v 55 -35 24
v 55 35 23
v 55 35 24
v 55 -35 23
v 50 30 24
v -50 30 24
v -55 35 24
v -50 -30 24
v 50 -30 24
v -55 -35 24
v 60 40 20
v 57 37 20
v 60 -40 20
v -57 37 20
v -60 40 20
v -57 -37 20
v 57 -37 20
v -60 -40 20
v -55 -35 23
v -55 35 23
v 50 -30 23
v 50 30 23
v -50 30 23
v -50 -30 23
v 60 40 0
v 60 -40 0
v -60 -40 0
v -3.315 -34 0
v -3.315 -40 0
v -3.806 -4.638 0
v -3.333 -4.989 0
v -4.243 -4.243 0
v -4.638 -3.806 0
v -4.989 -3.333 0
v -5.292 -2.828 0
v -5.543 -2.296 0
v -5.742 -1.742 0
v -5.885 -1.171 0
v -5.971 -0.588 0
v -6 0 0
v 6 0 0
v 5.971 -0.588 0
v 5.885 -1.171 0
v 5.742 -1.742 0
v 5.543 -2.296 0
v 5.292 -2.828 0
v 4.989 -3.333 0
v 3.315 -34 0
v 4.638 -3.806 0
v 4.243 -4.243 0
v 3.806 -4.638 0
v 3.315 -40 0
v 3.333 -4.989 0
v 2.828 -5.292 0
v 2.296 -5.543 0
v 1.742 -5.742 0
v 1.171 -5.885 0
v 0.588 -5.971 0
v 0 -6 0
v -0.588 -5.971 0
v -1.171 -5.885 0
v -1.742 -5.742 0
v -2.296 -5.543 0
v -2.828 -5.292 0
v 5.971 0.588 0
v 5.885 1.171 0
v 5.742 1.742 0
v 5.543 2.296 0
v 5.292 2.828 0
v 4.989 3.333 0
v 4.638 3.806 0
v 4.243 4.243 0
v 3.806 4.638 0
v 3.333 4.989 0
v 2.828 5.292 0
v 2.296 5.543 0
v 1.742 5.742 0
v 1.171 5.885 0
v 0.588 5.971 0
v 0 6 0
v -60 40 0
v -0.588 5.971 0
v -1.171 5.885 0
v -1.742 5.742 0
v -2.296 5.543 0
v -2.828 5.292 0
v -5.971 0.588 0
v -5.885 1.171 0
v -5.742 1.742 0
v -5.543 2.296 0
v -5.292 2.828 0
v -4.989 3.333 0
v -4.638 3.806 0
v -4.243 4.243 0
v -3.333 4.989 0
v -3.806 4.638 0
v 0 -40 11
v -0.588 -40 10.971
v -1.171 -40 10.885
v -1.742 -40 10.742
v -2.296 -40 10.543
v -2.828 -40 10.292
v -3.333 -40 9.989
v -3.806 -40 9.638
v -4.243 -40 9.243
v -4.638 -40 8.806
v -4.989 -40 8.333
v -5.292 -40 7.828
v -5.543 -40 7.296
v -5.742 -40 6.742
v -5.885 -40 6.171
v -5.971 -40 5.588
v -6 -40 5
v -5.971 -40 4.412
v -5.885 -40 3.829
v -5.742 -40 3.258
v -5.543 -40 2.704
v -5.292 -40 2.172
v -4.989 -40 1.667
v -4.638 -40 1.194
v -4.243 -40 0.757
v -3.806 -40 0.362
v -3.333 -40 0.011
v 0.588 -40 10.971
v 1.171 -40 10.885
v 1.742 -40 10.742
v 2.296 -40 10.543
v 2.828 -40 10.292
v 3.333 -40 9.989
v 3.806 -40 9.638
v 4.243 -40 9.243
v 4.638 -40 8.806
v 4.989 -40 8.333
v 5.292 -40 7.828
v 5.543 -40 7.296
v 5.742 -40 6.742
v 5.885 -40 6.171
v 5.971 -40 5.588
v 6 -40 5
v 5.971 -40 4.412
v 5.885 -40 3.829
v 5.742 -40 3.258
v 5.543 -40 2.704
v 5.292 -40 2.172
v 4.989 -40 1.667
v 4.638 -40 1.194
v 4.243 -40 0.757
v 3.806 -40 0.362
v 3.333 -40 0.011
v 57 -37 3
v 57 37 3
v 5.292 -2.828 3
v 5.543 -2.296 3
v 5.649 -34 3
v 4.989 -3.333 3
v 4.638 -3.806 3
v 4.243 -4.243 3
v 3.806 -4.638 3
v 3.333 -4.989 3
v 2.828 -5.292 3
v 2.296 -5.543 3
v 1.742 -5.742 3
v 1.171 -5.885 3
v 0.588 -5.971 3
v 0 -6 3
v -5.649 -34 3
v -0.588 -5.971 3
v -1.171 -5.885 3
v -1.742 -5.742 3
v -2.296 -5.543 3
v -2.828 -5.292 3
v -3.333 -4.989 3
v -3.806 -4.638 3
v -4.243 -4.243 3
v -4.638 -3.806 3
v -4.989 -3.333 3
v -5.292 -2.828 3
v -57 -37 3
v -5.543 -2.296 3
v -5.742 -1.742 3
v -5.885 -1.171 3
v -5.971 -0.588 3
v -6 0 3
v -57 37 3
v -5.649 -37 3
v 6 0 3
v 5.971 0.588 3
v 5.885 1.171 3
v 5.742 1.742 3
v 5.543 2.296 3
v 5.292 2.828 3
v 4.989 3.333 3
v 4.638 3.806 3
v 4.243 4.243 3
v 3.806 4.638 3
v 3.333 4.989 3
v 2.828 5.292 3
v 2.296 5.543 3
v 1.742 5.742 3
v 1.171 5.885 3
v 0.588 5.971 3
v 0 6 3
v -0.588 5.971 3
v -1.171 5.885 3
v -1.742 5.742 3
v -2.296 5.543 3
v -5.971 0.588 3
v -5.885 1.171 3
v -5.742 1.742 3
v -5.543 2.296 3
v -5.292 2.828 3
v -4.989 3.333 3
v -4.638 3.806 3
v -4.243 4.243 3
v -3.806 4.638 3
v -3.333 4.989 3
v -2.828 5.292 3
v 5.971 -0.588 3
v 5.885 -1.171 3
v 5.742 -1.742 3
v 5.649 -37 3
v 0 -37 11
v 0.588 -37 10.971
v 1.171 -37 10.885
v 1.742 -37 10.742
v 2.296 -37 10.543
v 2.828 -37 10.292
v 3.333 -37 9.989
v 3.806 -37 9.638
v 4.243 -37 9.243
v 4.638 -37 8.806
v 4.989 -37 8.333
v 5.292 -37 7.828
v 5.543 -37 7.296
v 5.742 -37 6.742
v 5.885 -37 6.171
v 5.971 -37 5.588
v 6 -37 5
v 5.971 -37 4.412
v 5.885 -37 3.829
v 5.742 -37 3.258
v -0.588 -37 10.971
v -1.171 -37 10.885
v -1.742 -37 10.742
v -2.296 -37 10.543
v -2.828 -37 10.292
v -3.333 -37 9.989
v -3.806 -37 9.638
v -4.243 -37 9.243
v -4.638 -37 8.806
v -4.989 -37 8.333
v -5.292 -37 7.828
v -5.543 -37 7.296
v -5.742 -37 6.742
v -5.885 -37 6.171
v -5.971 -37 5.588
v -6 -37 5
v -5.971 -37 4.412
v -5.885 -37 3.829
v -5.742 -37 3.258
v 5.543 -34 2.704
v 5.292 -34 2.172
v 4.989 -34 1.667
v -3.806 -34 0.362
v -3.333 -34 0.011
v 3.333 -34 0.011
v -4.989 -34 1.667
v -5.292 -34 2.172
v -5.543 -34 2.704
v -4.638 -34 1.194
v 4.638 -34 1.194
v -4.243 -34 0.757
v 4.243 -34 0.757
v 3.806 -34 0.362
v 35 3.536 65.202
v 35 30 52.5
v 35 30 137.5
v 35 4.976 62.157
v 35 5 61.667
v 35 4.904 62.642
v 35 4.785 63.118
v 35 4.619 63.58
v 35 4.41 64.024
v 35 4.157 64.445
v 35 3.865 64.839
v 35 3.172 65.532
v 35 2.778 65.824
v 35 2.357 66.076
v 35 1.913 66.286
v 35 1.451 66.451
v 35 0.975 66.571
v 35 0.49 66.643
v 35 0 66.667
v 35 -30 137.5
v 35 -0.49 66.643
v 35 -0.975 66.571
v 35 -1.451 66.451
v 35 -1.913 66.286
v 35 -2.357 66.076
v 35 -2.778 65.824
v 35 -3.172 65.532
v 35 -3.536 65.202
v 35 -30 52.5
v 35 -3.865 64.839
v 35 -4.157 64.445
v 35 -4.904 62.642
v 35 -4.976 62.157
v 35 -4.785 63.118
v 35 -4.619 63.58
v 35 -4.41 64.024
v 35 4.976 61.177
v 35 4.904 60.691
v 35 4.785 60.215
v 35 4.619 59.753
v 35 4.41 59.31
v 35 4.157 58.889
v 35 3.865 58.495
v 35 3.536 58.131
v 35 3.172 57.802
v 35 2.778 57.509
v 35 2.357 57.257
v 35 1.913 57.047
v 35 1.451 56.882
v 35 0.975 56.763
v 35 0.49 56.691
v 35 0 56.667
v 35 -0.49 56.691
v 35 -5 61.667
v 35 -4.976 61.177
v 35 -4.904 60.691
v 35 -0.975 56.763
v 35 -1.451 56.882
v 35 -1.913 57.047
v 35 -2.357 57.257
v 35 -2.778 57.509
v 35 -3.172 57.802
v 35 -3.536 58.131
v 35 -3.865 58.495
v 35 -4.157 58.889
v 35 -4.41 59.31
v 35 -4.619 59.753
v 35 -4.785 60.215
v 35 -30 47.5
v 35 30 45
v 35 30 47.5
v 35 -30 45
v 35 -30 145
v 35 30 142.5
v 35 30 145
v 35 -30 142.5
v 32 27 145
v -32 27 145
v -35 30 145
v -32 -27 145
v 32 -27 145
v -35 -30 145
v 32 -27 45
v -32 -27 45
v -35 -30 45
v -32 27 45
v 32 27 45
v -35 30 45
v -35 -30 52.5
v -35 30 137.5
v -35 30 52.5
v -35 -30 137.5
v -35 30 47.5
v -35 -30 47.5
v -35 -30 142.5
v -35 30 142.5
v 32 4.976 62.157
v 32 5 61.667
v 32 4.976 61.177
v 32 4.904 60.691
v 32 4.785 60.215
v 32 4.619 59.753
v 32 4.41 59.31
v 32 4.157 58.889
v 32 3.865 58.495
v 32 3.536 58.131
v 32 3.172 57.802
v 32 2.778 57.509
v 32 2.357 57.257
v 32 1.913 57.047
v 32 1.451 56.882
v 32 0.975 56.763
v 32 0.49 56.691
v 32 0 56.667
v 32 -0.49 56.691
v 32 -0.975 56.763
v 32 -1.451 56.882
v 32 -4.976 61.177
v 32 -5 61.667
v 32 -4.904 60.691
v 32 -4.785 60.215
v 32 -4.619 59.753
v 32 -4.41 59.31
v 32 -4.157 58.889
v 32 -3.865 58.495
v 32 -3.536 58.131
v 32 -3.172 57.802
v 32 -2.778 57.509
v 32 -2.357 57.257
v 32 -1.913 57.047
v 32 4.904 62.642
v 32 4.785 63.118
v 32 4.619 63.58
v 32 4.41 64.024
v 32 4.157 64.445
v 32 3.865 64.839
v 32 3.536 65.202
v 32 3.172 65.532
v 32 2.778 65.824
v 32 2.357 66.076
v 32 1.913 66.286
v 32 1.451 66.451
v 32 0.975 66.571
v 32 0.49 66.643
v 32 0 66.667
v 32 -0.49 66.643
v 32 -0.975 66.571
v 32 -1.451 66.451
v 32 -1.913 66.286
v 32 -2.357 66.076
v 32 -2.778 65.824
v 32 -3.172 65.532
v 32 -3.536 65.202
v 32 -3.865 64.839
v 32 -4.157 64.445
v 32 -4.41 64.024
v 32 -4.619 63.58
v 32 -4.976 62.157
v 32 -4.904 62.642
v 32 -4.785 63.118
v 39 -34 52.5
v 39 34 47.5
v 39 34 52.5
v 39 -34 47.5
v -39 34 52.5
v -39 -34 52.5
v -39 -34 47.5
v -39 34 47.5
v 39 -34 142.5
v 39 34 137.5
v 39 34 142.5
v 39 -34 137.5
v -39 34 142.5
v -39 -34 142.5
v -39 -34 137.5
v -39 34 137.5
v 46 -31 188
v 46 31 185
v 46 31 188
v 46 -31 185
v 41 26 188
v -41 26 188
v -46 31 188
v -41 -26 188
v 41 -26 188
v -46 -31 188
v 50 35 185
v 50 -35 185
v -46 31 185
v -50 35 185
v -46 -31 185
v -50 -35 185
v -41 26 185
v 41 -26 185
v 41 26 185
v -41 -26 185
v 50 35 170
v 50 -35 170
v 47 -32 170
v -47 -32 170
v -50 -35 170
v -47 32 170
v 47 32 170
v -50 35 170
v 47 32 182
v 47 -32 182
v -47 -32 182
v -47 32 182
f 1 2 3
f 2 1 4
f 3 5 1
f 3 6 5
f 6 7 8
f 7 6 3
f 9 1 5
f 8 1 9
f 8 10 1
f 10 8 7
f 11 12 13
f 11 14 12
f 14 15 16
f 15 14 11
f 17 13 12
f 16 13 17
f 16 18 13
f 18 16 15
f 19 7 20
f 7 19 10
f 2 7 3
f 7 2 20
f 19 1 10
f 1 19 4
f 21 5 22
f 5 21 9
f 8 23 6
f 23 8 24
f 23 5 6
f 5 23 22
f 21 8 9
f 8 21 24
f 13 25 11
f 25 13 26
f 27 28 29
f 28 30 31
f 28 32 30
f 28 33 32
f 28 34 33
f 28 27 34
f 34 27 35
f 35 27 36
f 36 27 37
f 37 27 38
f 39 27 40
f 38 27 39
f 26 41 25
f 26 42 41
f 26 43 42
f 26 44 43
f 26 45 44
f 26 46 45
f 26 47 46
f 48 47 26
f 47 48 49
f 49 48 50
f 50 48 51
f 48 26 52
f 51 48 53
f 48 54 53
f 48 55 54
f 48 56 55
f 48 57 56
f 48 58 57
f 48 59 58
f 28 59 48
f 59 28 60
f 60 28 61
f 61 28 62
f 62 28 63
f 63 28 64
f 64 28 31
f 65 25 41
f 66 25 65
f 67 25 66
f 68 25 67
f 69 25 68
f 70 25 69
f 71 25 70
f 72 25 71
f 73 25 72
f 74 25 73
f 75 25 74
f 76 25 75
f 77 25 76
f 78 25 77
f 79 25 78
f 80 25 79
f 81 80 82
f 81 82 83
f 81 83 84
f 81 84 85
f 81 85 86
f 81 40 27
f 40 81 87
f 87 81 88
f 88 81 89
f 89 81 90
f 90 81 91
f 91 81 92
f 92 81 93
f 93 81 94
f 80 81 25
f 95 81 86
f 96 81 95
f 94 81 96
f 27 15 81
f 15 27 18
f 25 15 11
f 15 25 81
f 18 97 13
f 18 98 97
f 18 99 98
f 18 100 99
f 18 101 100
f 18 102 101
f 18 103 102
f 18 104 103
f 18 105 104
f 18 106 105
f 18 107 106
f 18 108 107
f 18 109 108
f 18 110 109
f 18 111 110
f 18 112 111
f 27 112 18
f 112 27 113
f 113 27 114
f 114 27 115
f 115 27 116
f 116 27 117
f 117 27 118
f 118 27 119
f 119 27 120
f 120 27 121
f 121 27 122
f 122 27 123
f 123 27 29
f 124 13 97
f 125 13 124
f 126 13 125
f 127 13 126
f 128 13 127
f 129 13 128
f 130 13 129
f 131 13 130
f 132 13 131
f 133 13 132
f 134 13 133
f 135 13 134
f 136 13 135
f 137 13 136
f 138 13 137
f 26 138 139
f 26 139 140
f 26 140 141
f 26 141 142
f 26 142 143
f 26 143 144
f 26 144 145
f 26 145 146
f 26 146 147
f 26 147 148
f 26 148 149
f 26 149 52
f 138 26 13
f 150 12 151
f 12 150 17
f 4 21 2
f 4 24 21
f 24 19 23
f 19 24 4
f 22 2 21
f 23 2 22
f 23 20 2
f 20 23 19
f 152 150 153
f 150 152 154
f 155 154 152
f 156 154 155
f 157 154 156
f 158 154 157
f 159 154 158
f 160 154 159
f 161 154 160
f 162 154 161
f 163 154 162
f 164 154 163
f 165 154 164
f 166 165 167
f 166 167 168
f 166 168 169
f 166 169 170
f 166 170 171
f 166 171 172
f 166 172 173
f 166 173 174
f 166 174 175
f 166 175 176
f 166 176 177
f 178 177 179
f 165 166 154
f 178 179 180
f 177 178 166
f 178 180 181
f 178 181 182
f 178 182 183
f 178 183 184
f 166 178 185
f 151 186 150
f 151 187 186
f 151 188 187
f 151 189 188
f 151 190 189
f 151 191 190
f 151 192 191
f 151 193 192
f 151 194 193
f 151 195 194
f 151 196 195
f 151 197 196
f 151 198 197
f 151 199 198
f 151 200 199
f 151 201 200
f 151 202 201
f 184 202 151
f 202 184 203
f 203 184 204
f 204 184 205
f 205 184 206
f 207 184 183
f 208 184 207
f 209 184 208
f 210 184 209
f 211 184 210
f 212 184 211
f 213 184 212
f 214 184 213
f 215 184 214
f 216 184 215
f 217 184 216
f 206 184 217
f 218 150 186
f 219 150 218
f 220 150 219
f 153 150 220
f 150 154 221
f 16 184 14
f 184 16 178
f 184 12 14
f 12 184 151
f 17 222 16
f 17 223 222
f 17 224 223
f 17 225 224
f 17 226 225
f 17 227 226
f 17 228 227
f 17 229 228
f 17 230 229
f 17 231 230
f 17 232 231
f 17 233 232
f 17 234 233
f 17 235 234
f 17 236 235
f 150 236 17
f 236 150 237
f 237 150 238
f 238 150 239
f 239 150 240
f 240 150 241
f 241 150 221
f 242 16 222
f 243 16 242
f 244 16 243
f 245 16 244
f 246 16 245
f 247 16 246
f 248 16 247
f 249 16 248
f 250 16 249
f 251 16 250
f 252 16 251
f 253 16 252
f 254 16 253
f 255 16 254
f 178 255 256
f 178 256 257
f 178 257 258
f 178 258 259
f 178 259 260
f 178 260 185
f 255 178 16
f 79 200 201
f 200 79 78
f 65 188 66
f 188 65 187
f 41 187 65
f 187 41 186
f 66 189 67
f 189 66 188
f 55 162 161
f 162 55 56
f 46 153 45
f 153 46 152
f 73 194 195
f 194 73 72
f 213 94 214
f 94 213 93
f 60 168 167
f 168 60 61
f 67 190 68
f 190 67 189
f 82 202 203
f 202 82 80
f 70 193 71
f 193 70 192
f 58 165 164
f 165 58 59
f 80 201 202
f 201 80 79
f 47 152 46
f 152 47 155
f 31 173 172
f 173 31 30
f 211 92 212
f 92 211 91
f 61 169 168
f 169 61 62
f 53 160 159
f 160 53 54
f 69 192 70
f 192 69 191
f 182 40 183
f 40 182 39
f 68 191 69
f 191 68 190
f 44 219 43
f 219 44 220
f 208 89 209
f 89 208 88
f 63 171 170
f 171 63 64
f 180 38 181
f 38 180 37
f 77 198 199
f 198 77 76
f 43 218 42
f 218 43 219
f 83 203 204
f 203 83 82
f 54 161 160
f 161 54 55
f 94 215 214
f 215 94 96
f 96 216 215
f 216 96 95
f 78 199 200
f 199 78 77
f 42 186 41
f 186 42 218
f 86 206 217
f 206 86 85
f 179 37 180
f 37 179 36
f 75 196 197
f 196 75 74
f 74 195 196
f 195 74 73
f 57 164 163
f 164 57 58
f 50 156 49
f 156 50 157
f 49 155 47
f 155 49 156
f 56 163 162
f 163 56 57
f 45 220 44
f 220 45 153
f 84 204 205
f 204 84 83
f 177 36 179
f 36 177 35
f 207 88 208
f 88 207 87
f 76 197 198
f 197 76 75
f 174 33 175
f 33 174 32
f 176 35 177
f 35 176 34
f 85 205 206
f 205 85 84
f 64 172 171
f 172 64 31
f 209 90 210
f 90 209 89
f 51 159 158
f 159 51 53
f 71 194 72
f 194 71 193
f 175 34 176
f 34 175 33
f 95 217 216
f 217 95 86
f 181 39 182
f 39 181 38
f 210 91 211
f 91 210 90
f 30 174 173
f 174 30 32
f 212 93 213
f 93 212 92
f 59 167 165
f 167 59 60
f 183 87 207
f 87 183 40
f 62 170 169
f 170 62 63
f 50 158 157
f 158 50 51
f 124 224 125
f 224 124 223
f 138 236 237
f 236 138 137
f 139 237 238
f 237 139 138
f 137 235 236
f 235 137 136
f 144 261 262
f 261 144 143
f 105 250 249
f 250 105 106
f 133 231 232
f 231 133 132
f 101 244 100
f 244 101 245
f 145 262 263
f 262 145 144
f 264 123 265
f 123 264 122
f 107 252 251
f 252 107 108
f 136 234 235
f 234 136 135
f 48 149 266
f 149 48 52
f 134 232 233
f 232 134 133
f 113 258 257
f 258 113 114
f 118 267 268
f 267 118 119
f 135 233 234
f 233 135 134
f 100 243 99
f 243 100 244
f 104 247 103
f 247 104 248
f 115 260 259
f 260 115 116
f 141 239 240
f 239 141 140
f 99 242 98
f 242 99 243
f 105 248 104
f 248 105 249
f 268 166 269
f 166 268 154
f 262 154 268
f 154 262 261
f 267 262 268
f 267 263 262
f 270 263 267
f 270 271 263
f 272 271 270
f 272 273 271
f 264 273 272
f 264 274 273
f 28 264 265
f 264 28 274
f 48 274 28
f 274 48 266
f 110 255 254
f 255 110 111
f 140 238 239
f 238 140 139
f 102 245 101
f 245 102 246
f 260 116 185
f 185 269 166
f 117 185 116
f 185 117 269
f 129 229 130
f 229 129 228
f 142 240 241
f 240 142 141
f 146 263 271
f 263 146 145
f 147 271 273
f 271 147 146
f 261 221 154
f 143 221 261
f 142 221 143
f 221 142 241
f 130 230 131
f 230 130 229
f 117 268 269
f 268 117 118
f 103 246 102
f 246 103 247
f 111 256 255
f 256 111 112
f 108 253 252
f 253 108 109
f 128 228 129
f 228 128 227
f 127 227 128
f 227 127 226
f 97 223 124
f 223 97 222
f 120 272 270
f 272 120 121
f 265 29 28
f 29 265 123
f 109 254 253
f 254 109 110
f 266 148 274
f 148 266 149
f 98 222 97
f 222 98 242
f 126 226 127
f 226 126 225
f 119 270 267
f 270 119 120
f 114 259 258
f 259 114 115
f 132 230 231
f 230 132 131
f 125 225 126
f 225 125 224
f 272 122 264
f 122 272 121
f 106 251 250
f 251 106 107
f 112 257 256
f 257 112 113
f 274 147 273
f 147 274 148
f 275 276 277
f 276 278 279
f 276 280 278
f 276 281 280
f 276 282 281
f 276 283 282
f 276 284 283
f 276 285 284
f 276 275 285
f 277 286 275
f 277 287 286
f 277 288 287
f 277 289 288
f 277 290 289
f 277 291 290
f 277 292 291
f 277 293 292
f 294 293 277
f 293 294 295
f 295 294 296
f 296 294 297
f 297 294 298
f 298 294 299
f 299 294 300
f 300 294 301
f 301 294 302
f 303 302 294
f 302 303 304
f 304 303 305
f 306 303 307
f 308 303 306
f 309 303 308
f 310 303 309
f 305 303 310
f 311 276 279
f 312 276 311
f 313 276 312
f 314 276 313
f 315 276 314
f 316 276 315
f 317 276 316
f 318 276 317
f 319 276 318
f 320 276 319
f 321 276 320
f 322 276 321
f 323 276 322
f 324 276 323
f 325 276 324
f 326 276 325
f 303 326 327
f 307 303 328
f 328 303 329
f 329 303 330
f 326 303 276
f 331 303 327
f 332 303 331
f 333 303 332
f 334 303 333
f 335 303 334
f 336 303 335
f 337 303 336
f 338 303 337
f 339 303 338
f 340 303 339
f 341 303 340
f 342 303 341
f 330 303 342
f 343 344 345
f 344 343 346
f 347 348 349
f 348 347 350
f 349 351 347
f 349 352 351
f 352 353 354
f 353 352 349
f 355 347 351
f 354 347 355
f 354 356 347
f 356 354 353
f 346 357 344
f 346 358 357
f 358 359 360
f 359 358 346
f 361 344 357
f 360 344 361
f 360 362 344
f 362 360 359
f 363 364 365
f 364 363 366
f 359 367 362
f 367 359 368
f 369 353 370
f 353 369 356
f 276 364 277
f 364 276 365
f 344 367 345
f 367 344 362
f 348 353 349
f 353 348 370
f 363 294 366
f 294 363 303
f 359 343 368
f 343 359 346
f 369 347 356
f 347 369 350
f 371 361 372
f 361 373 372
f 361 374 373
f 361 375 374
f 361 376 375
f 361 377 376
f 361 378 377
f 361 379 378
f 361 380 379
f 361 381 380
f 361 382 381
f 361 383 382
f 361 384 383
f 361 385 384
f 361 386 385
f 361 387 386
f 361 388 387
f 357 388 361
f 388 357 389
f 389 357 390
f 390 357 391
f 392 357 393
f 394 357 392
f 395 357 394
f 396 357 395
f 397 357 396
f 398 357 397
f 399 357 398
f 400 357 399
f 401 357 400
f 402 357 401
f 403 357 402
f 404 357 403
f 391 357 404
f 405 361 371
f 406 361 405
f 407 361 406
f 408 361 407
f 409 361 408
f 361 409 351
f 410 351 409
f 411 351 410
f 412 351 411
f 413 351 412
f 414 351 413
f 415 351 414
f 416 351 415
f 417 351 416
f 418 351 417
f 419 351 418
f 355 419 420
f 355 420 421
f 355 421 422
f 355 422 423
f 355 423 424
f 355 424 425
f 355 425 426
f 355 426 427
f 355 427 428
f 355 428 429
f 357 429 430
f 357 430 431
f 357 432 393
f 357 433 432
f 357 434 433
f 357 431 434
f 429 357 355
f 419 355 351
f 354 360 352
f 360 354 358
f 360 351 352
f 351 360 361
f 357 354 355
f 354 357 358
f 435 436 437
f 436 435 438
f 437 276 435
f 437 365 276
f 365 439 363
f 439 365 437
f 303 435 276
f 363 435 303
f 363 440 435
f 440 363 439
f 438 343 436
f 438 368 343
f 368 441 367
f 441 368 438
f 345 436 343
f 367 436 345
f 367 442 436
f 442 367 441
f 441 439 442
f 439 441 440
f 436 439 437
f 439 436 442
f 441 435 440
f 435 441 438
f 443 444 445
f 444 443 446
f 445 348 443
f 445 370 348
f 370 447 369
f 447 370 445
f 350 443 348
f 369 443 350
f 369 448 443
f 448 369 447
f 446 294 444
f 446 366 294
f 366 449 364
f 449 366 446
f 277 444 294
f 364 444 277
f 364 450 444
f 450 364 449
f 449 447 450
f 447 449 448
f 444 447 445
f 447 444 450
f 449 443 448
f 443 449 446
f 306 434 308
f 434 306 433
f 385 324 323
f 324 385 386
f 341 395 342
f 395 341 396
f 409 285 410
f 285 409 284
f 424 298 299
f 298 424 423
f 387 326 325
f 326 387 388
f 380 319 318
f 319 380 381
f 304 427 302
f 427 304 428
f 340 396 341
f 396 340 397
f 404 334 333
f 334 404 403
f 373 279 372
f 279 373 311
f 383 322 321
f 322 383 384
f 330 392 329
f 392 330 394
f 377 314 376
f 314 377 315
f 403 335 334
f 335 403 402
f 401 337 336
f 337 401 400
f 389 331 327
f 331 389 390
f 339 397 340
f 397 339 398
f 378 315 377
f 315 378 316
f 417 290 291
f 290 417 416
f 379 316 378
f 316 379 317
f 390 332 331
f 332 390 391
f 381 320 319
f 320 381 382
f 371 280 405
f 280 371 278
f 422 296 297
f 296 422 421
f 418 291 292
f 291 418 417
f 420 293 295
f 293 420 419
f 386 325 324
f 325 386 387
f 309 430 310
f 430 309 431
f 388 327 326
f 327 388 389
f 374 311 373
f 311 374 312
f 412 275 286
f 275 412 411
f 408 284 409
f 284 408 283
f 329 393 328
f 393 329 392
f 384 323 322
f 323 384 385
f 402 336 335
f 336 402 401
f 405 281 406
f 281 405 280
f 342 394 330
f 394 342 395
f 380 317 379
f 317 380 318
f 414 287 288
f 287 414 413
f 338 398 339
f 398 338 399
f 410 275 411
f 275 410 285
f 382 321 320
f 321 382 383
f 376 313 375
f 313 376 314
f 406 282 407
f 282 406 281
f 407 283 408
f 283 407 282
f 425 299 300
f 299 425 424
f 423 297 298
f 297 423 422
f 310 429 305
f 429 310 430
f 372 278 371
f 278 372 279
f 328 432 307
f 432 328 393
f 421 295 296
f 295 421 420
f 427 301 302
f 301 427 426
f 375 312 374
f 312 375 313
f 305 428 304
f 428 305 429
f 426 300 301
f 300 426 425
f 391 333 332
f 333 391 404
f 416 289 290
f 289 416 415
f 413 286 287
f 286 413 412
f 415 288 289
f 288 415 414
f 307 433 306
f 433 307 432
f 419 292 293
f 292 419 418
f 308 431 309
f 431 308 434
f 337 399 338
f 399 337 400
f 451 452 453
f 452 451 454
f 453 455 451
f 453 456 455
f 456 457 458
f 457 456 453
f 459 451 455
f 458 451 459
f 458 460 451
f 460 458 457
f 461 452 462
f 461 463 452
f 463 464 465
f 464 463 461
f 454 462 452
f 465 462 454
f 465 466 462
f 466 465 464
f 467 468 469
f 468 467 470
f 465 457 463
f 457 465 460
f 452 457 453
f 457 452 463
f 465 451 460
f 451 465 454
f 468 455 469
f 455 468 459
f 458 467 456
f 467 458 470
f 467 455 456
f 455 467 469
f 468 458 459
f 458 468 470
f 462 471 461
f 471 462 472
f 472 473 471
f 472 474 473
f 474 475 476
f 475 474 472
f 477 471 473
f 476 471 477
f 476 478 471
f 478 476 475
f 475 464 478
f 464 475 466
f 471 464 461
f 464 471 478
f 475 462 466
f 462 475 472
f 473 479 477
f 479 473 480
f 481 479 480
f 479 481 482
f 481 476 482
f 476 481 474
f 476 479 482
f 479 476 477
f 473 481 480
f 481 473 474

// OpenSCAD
// ============================================================
// PEDESTAL RECTANGULAR HUECO DE 3 PIEZAS
// Inspiración: pedestal de fantasía / templo antiguo
// Pensado para impresión 3D y electrónica interna
//
// Archivo: pedestal_zelda_3piezas.scad
// Unidades: milímetros
// ============================================================

$fn = 64;


// ============================================================
// PARÁMETROS
// ============================================================

// ---------- Base ----------
base_x = 120;
base_y = 80;
base_z = 20;

// ---------- Cuerpo central ----------
cuerpo_x = 70;
cuerpo_y = 60;
cuerpo_z = 100;

// ---------- Tapa ----------
tapa_x = 100;
tapa_y = 70;
tapa_z = 15;

// ---------- Grosor de paredes ----------
pared = 3;

// ---------- Encajes ----------
encaje_x = 58;
encaje_y = 48;
encaje_z = 4;

// Tolerancia para impresión 3D
holgura = 0.30;

// ---------- Paso de cables ----------
cable_diam_inferior = 12;
cable_diam_lateral = 10;

// ---------- Vista ----------
modo_explotado = true;
separacion = 25;


// ============================================================
// MÓDULOS AUXILIARES
// ============================================================

// Caja rectangular hueca abierta arriba y abajo
module tubo_rectangular(x, y, z, espesor) {
    difference() {
        cube([x, y, z], center = true);

        cube([
            x - 2 * espesor,
            y - 2 * espesor,
            z + 2
        ], center = true);
    }
}


// Marco rectangular decorativo
module marco_rectangular(x, y, z, ancho) {
    difference() {
        cube([x, y, z], center = true);

        cube([
            x - 2 * ancho,
            y - 2 * ancho,
            z + 2
        ], center = true);
    }
}


// Encaje hueco
module anillo_encaje(x, y, z, espesor) {
    difference() {
        cube([x, y, z], center = true);

        cube([
            x - 2 * espesor,
            y - 2 * espesor,
            z + 2
        ], center = true);
    }
}


// ============================================================
// PIEZA 1 - BASE HUECA
// ============================================================

module base() {
    difference() {
        union() {
            // Cuerpo exterior de la base
            cube([
                base_x,
                base_y,
                base_z
            ], center = true);

            // Marco superior decorativo
            translate([
                0,
                0,
                base_z / 2 + 2
            ])
            marco_rectangular(
                base_x - 10,
                base_y - 10,
                4,
                5
            );
        }

        // Hueco interior
        translate([
            0,
            0,
            pared
        ])
        cube([
            base_x - 2 * pared,
            base_y - 2 * pared,
            base_z
        ], center = true);

        // Rebaje para recibir el cuerpo
        translate([
            0,
            0,
            base_z / 2 - encaje_z / 2
        ])
        cube([
            encaje_x + 2 * holgura,
            encaje_y + 2 * holgura,
            encaje_z + 0.5
        ], center = true);

        // Paso inferior para cables
        translate([
            0,
            0,
            -base_z / 2
        ])
        cylinder(
            h = pared * 4,
            d = cable_diam_inferior,
            center = true
        );

        // Salida frontal de cable
        translate([
            0,
            -base_y / 2,
            -base_z / 4
        ])
        rotate([90, 0, 0])
        cylinder(
            h = pared * 4,
            d = cable_diam_inferior,
            center = true
        );
    }
}


// ============================================================
// PIEZA 2 - CUERPO CENTRAL HUECO
// ============================================================

module cuerpo() {
    difference() {
        union() {
            // Columna hueca
            tubo_rectangular(
                cuerpo_x,
                cuerpo_y,
                cuerpo_z,
                pared
            );

            // Moldura inferior
            translate([
                0,
                0,
                -cuerpo_z / 2 + 5
            ])
            marco_rectangular(
                cuerpo_x + 8,
                cuerpo_y + 8,
                5,
                4
            );

            // Moldura superior
            translate([
                0,
                0,
                cuerpo_z / 2 - 5
            ])
            marco_rectangular(
                cuerpo_x + 8,
                cuerpo_y + 8,
                5,
                4
            );

            // Encaje inferior macho
            translate([
                0,
                0,
                -cuerpo_z / 2 - encaje_z / 2
            ])
            anillo_encaje(
                encaje_x,
                encaje_y,
                encaje_z,
                pared
            );

            // Encaje superior macho
            translate([
                0,
                0,
                cuerpo_z / 2 + encaje_z / 2
            ])
            anillo_encaje(
                encaje_x,
                encaje_y,
                encaje_z,
                pared
            );
        }

        // Hueco central continuo
        cube([
            cuerpo_x - 2 * pared,
            cuerpo_y - 2 * pared,
            cuerpo_z + encaje_z * 4
        ], center = true);

        // Paso lateral para USB / alimentación
        translate([
            cuerpo_x / 2,
            0,
            -cuerpo_z / 3
        ])
        rotate([0, 90, 0])
        cylinder(
            h = pared * 5,
            d = cable_diam_lateral,
            center = true
        );
    }
}


// ============================================================
// PIEZA 3 - TAPA SUPERIOR HUECA
// ============================================================

module tapa() {
    difference() {
        union() {
            // Volumen exterior
            cube([
                tapa_x,
                tapa_y,
                tapa_z
            ], center = true);

            // Marco superior decorativo
            translate([
                0,
                0,
                tapa_z / 2 + 1.5
            ])
            marco_rectangular(
                tapa_x - 8,
                tapa_y - 8,
                3,
                5
            );
        }

        // Hueco interior
        translate([
            0,
            0,
            -pared
        ])
        cube([
            tapa_x - 2 * pared,
            tapa_y - 2 * pared,
            tapa_z
        ], center = true);

        // Rebaje inferior para el encaje
        translate([
            0,
            0,
            -tapa_z / 2 + encaje_z / 2
        ])
        cube([
            encaje_x + 2 * holgura,
            encaje_y + 2 * holgura,
            encaje_z + 0.5
        ], center = true);
    }
}


// ============================================================
// MONTAJE
// ============================================================

module pedestal_montado() {
    // Base
    translate([
        0,
        0,
        base_z / 2
    ])
    base();

    // Cuerpo
    translate([
        0,
        0,
        base_z + cuerpo_z / 2
    ])
    cuerpo();

    // Tapa
    translate([
        0,
        0,
        base_z + cuerpo_z + tapa_z / 2
    ])
    tapa();
}


// ============================================================
// VISTA EXPLOTADA
// ============================================================

module pedestal_explotado() {
    // Base
    translate([
        0,
        0,
        base_z / 2
    ])
    base();

    // Cuerpo
    translate([
        0,
        0,
        base_z +
        separacion +
        cuerpo_z / 2
    ])
    cuerpo();

    // Tapa
    translate([
        0,
        0,
        base_z +
        cuerpo_z +
        separacion * 2 +
        tapa_z / 2
    ])
    tapa();
}


// ============================================================
// SALIDA
// ============================================================

if (modo_explotado) {
    pedestal_explotado();
} else {
    pedestal_montado();
}


// ============================================================
// EXPORTACIÓN INDIVIDUAL A STL
// ============================================================
//
// Para exportar una sola pieza, comenta la salida anterior y
// descomenta únicamente una de estas líneas:
//
// base();
// cuerpo();
// tapa();
//
// Después usa F6 y:
// File -> Export -> Export as STL
//
